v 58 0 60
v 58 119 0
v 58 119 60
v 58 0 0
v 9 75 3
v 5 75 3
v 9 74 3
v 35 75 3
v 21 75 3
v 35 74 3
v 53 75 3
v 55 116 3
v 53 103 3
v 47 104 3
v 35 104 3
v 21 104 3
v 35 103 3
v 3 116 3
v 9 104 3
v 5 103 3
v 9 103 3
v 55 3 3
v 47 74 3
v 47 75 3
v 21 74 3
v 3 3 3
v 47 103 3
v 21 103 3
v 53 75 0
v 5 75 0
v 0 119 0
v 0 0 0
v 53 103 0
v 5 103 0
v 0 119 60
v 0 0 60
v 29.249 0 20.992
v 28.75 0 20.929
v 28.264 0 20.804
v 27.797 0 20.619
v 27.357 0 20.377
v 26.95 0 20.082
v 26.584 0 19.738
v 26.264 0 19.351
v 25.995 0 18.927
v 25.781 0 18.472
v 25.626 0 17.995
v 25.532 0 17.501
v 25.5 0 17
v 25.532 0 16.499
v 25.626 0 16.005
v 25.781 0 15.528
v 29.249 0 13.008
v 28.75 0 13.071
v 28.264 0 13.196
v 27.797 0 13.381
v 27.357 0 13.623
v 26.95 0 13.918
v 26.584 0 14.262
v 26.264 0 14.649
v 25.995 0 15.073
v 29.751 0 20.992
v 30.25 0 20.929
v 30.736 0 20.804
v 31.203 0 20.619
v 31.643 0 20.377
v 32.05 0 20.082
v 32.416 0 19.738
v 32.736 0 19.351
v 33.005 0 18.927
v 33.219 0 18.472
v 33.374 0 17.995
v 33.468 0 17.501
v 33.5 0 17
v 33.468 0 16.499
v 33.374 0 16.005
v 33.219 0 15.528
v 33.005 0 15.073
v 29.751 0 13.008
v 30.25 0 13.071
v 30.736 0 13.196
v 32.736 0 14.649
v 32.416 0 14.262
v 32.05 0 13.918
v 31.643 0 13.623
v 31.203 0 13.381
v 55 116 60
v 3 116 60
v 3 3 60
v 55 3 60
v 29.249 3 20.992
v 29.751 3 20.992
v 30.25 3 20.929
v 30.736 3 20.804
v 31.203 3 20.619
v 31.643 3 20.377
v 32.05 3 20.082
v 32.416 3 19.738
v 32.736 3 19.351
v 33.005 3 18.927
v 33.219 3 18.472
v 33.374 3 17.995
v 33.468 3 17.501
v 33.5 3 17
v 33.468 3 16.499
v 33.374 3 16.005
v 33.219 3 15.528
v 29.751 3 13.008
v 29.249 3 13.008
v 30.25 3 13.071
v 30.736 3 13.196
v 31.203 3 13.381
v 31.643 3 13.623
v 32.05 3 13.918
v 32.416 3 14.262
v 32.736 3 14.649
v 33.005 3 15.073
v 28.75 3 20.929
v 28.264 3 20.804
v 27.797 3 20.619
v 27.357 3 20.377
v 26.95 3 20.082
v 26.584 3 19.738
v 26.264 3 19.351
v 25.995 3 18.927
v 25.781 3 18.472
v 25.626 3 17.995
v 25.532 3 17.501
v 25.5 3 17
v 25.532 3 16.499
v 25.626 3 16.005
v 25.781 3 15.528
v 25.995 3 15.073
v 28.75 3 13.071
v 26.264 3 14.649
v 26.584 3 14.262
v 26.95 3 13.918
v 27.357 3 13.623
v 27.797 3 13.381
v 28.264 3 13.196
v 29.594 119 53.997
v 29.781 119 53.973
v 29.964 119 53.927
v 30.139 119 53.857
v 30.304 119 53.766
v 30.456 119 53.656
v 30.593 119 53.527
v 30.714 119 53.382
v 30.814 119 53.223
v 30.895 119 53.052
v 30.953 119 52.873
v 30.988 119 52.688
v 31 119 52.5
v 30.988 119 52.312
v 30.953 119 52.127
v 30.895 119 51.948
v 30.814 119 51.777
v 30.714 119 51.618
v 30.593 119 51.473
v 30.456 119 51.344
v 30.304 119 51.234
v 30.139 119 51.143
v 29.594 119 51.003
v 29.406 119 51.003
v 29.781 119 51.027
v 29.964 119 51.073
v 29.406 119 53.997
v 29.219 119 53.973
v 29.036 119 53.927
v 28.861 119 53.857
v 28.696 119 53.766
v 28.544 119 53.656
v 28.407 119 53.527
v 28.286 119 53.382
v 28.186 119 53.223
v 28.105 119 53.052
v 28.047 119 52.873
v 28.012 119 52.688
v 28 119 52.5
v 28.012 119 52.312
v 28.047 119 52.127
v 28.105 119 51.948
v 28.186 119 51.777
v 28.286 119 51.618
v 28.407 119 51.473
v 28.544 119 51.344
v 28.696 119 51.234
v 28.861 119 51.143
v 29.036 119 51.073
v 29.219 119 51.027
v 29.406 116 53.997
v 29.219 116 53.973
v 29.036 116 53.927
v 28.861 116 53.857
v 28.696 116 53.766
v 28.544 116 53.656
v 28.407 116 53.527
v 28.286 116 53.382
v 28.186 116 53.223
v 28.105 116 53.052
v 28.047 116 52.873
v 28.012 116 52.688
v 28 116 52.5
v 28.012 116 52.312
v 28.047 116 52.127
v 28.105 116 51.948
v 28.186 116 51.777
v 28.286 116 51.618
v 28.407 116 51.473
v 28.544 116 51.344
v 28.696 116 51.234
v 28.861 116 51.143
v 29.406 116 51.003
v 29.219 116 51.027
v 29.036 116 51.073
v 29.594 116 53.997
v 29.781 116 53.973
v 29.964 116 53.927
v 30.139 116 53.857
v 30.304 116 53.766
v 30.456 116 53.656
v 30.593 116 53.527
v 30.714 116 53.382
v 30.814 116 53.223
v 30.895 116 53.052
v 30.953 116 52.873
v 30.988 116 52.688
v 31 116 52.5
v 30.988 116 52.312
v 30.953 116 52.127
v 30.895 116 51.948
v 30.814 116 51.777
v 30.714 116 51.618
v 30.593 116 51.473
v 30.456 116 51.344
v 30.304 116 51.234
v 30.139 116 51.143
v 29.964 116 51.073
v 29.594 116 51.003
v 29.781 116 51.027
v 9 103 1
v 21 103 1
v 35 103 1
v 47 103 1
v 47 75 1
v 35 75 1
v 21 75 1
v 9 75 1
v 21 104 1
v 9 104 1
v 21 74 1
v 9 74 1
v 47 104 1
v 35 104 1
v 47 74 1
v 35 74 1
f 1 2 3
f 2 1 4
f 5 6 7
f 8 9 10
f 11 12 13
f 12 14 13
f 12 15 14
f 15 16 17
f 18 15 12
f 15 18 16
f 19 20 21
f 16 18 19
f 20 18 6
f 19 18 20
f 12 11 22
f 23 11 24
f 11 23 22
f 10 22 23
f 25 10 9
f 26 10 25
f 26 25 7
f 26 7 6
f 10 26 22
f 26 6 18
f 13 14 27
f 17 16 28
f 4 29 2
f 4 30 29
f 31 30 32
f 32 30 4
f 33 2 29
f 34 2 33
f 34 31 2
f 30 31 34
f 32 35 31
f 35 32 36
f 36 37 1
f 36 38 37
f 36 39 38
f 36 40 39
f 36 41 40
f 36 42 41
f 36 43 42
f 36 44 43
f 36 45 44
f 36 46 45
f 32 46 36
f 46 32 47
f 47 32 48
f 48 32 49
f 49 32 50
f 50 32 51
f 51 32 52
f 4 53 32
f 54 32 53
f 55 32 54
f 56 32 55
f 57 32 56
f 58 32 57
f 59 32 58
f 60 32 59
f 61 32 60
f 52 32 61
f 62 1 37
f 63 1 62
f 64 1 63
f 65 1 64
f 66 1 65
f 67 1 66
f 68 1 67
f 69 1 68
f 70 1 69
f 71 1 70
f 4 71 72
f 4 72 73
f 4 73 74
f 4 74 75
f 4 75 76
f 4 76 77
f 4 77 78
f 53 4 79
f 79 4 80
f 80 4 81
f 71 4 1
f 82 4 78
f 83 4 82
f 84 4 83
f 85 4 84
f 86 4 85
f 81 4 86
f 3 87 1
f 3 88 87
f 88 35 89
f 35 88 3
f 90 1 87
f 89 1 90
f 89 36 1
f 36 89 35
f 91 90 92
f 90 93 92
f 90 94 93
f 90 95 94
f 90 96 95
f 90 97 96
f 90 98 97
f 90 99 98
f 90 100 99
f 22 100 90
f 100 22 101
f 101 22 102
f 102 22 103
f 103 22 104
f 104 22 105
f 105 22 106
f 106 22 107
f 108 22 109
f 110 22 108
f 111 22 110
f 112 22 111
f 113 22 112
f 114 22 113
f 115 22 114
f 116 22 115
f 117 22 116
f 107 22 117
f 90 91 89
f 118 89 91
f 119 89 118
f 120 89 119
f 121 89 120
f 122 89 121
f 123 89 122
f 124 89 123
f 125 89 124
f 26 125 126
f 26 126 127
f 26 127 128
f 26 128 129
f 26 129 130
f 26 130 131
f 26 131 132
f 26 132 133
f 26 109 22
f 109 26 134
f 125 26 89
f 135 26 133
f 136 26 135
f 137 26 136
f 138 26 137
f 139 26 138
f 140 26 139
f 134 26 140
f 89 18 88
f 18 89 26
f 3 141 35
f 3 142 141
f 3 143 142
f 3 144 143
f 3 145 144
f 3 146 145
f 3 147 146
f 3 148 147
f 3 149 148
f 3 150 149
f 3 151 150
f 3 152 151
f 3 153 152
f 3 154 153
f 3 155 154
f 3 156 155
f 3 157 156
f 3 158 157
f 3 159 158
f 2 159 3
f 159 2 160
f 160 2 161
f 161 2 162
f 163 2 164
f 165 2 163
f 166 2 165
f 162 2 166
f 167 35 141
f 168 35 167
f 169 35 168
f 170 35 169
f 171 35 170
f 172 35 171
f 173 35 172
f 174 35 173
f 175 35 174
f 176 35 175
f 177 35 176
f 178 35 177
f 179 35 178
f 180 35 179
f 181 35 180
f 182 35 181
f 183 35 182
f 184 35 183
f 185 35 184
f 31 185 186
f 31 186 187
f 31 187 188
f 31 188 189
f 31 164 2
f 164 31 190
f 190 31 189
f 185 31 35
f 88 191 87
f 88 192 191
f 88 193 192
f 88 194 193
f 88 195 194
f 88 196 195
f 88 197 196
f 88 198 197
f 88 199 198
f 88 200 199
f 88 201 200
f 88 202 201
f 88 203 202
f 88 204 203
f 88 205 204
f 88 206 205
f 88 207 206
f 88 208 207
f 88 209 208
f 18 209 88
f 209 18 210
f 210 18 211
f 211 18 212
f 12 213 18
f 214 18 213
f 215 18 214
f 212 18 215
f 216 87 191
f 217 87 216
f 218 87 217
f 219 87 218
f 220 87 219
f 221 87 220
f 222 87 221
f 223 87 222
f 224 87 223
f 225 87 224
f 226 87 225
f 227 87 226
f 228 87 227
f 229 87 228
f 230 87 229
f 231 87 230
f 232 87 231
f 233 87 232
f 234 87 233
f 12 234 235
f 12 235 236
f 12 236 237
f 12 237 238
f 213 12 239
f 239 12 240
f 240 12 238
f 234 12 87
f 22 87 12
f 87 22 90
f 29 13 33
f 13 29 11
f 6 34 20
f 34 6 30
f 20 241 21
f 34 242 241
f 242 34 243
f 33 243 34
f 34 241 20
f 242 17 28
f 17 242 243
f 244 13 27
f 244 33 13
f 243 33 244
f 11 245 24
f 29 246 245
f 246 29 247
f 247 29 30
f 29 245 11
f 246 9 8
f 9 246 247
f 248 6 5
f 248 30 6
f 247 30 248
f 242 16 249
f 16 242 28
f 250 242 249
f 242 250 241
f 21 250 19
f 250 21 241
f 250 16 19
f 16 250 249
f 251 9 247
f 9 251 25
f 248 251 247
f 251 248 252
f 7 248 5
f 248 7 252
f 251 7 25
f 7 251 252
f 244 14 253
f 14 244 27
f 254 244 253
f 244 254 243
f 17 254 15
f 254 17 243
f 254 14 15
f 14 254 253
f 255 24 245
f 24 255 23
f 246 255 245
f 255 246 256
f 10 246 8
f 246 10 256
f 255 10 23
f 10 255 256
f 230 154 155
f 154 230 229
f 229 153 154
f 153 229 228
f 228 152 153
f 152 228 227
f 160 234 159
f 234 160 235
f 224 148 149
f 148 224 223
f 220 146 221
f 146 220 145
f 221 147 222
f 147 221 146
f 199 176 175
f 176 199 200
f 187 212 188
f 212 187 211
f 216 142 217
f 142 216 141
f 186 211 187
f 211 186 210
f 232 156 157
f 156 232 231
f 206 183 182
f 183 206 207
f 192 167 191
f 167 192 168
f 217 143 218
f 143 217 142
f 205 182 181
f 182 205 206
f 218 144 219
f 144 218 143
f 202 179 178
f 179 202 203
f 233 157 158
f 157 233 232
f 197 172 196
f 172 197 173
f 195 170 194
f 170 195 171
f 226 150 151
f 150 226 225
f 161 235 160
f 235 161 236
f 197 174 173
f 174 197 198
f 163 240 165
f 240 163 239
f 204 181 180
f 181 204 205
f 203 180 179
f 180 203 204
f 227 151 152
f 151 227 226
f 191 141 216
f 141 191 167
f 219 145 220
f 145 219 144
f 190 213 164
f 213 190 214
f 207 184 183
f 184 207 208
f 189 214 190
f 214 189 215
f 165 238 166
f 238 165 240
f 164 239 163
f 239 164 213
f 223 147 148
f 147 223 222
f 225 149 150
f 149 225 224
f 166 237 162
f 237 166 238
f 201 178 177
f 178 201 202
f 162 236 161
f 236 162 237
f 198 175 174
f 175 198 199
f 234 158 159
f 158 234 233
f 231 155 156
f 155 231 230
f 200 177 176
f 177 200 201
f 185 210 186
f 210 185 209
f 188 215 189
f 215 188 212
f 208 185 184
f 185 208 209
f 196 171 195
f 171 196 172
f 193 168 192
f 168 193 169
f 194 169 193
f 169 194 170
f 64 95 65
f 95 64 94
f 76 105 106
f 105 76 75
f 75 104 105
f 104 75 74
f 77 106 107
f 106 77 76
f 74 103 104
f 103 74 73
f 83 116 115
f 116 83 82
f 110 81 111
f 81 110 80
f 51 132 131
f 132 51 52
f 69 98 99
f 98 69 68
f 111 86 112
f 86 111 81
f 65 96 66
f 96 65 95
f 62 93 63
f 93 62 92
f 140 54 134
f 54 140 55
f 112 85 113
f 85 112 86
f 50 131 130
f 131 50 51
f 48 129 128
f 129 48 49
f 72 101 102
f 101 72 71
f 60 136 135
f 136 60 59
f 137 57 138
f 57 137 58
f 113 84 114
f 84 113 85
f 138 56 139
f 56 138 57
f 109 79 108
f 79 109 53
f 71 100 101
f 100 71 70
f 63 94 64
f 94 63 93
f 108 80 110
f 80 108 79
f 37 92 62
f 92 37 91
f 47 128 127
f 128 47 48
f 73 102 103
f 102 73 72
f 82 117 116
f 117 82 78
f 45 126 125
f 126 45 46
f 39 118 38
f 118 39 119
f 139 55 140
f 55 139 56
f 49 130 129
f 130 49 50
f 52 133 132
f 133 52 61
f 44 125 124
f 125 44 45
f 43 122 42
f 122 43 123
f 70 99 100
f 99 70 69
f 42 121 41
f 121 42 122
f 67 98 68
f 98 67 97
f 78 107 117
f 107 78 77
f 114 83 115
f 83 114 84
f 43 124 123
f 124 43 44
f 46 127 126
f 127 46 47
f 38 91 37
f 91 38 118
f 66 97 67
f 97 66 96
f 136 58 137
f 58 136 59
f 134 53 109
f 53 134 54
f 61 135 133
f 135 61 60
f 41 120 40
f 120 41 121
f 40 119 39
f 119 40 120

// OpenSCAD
//main body

boxWidth = 112; // actually 110
boxHeight = 52; // actually 50
boxDepth = 60; // was 80

outletwidth = 28; // actually 27
outletHeight = 48; // actually 47.5

difference() {
	union() {
		cube([boxHeight+6, boxWidth + 6,3]); //bottom
		cube([boxHeight+6,3,boxDepth]);  //y0
		cube([3,boxWidth + 5,boxDepth]);  //x0
		translate([0,boxWidth + 4,0]) cube([boxHeight + 6,3,boxDepth]); //yn
		translate([boxHeight+3,0,0]) cube([3,boxWidth + 5,boxDepth]); //xn
		cube([3,6,boxDepth]); //x0y0 lip
		translate([boxHeight+3,0,0]) cube([3,6,boxDepth]); //yn lip
		translate([0,boxWidth,0]) cube([3,6,boxDepth]); //y0 lip
		translate([boxHeight+3,boxWidth,0]) cube([3,6,boxDepth]); //xnyn lip
	}
	translate([(boxHeight - outletHeight)/2 + 3,75,0]) cube([outletHeight,outletwidth,3]); //power switch hole
	translate([9,74 + outletwidth + 1,1]) cube([12,1,2]); // botom left notch for power switch
	translate([9,74,1]) cube([12,1,2]); //bottom right notch for power switch
	translate([35,74 + outletwidth + 1,1]) cube([12,1,2]); //top left notch for power switch
	translate([35,74,1]) cube([12,1,2]); //top right notch for power switch
	translate([4.5+25,10,52.5]) rotate([270,0,0]) cylinder(h=200, r=1.5, $fn=50); // screw hole - Attach to power supply
	translate([4.5+25,-50,17]) rotate([270,0,0]) cylinder(h=100, r=4, $fn=50); // hole for wires

}
